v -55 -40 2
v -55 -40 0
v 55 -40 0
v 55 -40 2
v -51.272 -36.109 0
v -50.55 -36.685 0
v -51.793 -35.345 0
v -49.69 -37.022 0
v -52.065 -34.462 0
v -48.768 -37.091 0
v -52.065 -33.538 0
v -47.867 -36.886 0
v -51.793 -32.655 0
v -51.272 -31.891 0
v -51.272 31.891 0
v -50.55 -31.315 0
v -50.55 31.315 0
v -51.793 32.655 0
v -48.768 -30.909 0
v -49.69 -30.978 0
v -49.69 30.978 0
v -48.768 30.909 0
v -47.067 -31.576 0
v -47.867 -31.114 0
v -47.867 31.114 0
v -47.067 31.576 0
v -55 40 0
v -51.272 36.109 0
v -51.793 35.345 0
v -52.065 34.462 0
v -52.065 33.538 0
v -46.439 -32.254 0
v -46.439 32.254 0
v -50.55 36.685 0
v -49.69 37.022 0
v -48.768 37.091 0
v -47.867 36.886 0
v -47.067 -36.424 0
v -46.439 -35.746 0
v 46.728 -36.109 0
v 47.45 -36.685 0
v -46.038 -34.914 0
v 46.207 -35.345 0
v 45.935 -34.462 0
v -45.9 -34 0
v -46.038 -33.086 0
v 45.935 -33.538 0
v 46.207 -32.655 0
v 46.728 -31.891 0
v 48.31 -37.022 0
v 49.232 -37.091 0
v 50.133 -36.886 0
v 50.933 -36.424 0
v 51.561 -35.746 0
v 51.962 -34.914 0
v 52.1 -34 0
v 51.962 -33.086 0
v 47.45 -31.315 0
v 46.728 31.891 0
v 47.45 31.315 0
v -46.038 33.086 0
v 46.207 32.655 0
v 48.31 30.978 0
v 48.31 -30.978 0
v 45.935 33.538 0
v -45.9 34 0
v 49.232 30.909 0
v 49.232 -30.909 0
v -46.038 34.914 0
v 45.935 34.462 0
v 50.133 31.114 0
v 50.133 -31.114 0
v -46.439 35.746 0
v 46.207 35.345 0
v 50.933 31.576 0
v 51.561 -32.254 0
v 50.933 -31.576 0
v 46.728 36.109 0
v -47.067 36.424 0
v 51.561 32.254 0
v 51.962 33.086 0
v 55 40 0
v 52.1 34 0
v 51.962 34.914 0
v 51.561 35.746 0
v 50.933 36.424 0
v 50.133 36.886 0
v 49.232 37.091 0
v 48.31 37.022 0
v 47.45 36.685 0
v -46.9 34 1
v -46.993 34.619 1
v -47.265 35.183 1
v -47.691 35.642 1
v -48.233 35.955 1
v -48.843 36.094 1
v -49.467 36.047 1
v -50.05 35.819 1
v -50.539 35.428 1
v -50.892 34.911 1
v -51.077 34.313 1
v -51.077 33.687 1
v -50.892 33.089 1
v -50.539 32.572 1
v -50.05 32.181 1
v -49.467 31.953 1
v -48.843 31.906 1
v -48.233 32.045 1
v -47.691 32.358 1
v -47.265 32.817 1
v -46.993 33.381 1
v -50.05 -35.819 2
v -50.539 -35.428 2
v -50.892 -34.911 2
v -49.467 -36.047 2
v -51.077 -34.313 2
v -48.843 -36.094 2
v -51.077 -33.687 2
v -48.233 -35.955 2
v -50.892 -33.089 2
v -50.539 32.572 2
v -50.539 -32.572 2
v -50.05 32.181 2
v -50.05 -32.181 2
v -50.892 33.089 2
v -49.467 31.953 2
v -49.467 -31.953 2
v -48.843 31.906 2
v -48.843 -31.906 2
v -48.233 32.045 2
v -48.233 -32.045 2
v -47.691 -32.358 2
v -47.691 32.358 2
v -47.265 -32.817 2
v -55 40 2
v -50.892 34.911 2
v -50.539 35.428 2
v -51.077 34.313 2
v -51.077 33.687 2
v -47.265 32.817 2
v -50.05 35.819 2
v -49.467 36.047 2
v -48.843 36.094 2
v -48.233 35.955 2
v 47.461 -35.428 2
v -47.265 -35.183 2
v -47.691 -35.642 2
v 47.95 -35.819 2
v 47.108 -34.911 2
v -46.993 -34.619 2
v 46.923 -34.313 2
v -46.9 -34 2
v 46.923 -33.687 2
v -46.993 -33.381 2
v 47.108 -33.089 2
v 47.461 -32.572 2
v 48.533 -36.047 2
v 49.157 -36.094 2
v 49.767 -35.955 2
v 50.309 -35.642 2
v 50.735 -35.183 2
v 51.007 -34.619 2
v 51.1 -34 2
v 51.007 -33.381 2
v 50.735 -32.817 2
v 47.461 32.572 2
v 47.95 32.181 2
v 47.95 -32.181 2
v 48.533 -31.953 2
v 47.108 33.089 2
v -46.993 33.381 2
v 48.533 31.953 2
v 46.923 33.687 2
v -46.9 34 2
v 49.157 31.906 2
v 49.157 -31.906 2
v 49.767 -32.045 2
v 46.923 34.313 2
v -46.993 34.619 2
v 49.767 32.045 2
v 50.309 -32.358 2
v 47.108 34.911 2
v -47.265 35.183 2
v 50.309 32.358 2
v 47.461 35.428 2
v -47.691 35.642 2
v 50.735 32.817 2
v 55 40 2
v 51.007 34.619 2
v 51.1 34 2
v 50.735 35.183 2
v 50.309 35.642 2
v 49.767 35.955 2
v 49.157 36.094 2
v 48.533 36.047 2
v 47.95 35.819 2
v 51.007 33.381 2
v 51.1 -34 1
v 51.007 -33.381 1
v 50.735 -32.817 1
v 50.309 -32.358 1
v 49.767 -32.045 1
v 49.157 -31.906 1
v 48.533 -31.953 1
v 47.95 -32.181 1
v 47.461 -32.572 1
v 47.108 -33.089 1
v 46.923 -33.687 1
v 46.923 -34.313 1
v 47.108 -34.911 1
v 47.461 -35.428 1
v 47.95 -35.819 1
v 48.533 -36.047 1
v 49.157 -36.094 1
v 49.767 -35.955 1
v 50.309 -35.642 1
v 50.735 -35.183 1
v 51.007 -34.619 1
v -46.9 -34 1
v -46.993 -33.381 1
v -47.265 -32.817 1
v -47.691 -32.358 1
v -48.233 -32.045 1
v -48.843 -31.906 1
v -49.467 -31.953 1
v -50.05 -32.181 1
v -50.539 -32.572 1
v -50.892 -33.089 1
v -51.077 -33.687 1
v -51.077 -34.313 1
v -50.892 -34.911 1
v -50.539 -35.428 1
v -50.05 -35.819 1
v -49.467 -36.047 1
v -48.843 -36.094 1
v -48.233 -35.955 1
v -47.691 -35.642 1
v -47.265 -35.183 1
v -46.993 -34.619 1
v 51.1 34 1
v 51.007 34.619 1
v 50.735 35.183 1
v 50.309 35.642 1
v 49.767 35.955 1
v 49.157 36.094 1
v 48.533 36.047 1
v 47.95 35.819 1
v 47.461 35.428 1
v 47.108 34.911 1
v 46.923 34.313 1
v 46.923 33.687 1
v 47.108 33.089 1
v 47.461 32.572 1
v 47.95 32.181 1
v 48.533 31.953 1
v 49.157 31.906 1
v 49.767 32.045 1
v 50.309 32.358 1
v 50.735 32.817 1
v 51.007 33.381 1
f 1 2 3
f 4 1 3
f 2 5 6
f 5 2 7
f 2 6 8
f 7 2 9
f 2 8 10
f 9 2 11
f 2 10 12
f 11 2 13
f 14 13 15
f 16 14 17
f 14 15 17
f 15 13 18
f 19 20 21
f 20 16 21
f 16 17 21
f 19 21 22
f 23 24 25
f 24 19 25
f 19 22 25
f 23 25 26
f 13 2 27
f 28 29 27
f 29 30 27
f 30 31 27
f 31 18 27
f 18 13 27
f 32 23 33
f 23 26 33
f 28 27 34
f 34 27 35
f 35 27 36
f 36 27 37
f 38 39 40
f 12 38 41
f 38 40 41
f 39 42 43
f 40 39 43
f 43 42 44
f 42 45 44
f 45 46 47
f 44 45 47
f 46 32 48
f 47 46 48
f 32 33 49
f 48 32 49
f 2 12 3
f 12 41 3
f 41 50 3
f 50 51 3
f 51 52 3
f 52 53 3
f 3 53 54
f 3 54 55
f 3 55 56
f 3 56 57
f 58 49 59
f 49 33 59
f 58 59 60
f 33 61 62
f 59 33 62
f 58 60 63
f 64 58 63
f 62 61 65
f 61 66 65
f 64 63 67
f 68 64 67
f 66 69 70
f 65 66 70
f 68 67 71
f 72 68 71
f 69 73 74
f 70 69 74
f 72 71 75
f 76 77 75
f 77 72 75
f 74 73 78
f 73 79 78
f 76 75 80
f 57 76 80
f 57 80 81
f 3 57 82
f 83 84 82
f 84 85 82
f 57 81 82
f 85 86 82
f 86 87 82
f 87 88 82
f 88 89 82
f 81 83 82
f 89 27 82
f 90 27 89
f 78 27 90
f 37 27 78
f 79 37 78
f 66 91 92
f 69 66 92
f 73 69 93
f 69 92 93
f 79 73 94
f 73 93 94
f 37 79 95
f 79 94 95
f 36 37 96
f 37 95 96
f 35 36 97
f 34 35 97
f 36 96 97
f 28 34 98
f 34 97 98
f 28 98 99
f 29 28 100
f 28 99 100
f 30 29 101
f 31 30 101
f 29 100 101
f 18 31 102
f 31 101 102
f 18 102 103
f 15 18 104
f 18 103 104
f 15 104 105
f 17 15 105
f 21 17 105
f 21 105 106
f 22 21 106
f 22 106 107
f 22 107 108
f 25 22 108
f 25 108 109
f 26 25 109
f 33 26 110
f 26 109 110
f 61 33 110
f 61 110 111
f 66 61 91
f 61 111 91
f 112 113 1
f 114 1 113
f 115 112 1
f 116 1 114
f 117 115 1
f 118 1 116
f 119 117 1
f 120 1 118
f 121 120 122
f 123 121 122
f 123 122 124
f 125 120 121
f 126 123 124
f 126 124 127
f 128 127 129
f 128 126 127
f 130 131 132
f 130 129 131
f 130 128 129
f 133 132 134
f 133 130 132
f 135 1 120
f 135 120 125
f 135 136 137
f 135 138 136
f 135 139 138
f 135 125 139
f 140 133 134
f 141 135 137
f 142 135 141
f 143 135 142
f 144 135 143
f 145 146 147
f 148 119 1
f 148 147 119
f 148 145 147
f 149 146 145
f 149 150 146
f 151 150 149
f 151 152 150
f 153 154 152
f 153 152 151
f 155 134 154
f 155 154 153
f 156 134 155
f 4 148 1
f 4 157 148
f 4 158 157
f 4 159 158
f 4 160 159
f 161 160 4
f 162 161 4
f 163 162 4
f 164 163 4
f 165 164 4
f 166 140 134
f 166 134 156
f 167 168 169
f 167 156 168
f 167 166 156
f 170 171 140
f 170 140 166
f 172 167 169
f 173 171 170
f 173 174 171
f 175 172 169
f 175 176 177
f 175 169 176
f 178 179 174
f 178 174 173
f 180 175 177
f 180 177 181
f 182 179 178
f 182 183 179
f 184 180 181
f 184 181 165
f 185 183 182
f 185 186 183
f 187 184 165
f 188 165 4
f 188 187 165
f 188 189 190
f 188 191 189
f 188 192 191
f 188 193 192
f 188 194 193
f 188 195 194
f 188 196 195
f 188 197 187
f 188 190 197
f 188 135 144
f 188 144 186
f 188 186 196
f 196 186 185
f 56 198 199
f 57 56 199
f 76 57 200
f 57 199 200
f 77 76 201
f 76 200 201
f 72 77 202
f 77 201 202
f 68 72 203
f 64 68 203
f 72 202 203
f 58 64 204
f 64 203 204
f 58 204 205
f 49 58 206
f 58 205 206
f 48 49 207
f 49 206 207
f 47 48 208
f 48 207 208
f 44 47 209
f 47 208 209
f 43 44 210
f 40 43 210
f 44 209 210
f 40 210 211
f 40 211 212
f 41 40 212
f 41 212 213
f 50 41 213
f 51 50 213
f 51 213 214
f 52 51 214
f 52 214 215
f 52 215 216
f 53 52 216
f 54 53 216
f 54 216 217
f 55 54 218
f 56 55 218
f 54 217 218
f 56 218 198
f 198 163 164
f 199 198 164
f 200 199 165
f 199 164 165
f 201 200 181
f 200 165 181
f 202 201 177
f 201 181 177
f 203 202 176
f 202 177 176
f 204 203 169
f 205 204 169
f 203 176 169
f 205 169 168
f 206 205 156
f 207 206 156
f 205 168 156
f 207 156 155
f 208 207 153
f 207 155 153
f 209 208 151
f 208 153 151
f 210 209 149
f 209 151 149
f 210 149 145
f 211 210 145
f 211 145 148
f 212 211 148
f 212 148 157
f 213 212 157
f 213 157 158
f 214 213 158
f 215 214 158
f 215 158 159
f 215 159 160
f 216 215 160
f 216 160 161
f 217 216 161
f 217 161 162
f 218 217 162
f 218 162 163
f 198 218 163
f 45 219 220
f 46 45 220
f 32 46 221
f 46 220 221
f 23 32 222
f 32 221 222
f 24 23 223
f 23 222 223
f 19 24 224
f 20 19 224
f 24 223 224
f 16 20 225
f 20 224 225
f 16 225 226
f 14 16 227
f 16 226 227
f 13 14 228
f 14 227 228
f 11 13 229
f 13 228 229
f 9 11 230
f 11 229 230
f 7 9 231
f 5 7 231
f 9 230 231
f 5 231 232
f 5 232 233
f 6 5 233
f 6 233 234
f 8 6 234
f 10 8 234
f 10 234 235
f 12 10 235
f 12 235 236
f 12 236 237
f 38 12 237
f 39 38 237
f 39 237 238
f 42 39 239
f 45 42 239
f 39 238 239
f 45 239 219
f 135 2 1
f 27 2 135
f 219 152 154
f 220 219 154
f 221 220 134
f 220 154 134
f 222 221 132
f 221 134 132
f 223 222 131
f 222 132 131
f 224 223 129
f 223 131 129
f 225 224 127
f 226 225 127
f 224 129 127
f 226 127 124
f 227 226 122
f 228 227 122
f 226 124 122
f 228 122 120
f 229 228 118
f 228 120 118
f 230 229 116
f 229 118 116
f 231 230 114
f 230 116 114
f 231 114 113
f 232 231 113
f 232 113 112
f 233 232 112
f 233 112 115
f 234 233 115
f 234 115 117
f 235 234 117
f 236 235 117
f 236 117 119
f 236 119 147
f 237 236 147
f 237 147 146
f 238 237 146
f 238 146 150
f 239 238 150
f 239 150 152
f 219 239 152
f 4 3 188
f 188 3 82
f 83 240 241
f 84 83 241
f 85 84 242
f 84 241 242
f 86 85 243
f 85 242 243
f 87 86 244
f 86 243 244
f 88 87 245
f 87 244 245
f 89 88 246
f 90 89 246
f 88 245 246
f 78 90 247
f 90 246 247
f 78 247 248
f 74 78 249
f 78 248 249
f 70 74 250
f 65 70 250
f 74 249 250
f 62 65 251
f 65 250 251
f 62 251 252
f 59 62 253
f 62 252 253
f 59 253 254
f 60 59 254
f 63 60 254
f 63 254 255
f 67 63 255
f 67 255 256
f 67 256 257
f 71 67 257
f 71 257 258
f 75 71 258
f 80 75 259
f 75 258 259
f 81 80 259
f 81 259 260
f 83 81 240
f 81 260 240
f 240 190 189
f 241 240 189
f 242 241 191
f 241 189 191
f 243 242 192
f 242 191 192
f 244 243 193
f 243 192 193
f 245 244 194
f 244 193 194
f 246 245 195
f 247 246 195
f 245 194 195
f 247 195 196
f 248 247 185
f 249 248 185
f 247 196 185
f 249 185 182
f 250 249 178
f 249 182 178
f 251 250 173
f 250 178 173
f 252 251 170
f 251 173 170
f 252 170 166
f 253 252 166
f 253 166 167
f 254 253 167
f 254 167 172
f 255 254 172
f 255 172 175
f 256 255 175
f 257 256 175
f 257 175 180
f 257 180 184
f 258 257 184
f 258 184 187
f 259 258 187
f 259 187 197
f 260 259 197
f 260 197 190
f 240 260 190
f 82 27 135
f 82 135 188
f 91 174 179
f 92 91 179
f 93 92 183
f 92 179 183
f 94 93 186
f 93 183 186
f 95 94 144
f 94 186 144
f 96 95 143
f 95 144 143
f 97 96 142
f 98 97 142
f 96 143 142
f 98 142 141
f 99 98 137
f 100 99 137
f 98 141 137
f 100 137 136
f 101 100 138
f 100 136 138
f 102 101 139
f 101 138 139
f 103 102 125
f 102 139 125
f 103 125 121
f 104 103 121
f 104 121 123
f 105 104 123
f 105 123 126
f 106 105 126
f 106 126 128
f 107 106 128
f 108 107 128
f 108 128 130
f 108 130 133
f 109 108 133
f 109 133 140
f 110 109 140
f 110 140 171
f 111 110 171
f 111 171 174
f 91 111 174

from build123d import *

# Parameters (mm, degrees)
SKETCH_W     = 110
SKETCH_H     = 80
PAD_DEPTH    = 2
SKETCH001_R  = 2.1
POCKET_DEPTH = 5
CHAMFER_SIZE = 1


with BuildPart() as part:
    # Sketch → Pad (new body)
    with BuildSketch(Plane.XY):
        Rectangle(SKETCH_W, SKETCH_H)
    extrude(amount=PAD_DEPTH)

    # Sketch001 (on Face6 of Pad) → Pocket (cut)
    with BuildSketch(Plane.XY.offset(2)):
        with Locations((49, 34)):
            Circle(SKETCH001_R)
        with Locations((-49, 34)):
            Circle(SKETCH001_R)
        with Locations((-49, -34)):
            Circle(SKETCH001_R)
        with Locations((49, -34)):
            Circle(SKETCH001_R)
    extrude(amount=-POCKET_DEPTH, mode=Mode.SUBTRACT)

    # Chamfer
    chamfer_edges = [part.edges().sort_by_distance(p)[0] for p in [
        (-51.1, -34, 0),
        (-51.1, 34, 0),
        (46.9, 34, 0),
        (46.9, -34, 0),
    ]]
    chamfer(chamfer_edges, length=CHAMFER_SIZE)


solid = part.part
